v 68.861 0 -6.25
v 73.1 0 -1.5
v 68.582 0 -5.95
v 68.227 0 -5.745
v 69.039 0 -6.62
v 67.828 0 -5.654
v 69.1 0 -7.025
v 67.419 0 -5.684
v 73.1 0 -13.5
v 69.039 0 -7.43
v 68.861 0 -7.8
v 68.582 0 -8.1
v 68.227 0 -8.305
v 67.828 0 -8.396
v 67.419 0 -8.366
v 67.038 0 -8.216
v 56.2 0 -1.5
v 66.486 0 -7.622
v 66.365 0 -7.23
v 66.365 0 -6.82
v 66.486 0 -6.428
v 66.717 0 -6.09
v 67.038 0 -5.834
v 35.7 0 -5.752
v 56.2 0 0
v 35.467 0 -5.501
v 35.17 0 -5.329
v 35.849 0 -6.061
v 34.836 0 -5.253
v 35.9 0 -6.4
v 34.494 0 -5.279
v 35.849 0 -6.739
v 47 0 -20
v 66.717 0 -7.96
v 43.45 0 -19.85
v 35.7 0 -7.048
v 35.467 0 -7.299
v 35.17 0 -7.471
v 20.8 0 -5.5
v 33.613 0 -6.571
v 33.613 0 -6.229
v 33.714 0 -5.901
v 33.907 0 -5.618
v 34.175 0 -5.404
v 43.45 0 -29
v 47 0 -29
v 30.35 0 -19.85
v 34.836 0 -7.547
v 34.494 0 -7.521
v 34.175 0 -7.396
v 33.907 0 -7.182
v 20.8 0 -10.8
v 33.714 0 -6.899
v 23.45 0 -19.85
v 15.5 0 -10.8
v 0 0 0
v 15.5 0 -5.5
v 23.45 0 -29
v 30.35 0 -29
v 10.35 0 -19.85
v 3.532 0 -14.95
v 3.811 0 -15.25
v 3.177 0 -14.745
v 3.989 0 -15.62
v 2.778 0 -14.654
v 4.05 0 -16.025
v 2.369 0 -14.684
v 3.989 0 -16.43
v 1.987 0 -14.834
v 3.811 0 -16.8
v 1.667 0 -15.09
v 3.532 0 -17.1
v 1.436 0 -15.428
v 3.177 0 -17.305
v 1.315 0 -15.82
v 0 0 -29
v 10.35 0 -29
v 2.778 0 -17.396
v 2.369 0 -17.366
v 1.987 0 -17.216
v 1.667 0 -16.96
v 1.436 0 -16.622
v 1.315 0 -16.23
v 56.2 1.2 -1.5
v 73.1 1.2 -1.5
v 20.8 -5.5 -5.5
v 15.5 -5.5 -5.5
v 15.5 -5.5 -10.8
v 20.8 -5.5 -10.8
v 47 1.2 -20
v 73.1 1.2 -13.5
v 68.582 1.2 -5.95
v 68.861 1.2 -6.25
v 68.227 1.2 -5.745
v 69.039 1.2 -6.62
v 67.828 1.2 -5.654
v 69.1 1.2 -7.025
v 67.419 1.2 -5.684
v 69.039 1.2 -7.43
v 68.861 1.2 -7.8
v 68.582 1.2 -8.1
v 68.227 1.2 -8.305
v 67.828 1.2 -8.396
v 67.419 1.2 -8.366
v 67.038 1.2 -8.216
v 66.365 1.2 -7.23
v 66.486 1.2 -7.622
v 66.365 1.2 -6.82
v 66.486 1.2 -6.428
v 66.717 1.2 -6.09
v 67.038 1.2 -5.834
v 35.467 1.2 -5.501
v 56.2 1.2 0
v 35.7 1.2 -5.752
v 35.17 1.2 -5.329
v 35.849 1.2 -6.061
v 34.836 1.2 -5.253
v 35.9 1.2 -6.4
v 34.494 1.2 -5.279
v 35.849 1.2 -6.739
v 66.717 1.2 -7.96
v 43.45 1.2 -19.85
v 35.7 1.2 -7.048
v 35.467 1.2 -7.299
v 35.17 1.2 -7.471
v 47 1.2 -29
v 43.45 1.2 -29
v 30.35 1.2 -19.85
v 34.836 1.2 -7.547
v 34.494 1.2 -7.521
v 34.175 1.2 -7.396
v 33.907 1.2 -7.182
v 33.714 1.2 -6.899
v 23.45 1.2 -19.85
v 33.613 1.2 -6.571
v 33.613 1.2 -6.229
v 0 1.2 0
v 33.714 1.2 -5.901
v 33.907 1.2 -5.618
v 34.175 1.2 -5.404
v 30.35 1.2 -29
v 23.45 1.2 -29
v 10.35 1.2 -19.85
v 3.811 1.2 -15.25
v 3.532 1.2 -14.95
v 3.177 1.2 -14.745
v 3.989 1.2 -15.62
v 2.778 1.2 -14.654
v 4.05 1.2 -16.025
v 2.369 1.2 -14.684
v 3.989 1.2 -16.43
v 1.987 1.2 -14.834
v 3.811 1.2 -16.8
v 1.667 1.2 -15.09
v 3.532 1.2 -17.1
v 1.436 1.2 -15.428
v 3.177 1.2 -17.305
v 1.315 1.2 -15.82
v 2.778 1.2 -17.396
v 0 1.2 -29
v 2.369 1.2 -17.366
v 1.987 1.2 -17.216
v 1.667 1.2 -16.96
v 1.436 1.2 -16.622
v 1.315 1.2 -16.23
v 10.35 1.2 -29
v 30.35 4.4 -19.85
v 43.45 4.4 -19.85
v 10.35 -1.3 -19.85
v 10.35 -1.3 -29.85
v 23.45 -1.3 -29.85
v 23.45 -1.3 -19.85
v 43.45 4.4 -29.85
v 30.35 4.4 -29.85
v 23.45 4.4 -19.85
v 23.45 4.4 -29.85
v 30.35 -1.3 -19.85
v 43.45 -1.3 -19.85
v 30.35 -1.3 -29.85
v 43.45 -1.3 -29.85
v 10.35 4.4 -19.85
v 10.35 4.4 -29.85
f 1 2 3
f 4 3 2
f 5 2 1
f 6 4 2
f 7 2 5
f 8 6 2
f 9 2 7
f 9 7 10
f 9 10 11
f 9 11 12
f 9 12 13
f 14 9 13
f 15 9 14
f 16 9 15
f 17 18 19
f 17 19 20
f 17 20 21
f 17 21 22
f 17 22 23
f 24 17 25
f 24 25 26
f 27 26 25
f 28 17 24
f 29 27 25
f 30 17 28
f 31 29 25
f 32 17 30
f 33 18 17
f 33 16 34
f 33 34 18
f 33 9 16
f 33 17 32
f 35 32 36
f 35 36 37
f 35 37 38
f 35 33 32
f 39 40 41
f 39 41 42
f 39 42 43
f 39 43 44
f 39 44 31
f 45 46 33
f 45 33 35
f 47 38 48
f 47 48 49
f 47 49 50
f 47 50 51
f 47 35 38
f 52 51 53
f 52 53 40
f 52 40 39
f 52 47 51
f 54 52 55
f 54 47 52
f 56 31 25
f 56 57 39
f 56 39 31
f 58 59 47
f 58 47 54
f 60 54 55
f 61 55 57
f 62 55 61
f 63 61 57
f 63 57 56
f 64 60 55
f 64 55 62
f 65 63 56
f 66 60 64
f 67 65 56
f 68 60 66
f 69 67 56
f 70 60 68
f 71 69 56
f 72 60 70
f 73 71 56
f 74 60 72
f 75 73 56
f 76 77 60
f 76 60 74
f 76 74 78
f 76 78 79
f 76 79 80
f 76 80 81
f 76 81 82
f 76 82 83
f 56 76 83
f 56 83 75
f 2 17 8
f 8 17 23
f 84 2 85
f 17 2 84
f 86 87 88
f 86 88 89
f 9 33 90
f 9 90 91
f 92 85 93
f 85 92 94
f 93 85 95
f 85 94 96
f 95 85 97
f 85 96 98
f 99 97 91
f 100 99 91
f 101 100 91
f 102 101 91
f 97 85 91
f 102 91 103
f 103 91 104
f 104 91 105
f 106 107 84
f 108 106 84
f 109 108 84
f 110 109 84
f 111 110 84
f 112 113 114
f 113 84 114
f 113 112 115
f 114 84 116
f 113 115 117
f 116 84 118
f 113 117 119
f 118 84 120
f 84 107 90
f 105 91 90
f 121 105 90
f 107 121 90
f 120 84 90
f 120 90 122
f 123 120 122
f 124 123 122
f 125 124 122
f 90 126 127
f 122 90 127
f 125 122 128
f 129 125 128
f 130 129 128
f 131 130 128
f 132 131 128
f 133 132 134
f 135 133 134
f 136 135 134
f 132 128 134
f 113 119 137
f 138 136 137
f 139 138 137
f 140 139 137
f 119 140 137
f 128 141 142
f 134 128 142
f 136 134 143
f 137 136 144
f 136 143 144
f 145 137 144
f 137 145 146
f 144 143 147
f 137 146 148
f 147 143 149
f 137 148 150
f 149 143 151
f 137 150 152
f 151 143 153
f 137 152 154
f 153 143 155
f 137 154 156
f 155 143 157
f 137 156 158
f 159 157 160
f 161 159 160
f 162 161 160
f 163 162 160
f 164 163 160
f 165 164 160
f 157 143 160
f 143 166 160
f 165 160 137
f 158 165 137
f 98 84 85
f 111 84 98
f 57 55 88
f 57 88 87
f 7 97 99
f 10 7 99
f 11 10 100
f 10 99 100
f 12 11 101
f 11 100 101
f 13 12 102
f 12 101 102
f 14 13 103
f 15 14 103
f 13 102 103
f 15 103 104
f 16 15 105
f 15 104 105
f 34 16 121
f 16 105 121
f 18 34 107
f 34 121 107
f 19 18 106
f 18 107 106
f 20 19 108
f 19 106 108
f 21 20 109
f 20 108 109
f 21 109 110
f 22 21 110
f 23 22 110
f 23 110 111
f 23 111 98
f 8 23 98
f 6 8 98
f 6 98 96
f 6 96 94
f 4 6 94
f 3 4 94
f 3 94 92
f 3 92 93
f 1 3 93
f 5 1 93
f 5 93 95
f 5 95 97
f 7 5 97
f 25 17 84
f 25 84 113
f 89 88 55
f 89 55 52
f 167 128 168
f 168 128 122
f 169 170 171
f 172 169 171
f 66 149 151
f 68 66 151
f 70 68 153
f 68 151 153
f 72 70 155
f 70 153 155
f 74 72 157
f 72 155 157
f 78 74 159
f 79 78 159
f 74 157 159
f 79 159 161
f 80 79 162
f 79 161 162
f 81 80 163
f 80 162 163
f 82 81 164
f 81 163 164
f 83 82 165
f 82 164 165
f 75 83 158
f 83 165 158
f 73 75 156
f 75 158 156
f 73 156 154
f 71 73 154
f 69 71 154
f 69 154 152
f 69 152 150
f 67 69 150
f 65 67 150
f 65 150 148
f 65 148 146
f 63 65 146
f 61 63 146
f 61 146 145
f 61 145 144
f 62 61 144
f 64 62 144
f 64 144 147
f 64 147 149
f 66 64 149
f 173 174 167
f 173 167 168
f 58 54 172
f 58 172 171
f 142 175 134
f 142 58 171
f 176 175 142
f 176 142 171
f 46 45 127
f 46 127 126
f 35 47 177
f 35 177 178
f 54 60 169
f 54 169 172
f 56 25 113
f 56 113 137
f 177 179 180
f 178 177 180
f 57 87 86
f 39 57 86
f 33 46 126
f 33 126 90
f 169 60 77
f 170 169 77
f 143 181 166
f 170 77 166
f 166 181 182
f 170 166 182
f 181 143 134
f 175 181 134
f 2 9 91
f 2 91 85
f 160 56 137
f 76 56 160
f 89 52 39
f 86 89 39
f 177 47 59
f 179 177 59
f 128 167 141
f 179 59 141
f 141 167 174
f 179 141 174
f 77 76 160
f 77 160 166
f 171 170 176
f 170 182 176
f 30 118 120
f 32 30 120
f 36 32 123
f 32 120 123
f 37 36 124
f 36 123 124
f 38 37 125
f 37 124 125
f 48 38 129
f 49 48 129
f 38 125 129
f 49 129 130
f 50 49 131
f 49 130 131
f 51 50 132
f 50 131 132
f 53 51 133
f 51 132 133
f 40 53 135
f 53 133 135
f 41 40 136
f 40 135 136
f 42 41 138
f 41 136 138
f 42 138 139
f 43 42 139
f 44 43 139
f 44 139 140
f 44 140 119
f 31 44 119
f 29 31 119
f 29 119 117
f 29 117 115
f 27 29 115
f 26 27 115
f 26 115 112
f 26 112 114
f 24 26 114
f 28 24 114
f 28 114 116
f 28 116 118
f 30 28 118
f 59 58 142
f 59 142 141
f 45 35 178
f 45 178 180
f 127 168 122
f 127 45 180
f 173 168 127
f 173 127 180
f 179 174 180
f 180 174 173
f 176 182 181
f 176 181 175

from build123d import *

# Parameters (mm, degrees)
EXTRUDE_1_DEPTH      = 1.2
SKETCH_2_R           = 1.375
SKETCH_2_R_2         = 1.15
CUT_EXTRUDE_1_DEPTH  = 2.2
SKETCH_3_W           = 13.1
SKETCH_3_H           = 10
EXTRUDE_2_DEPTH      = 3.2
EXTRUDE_2_DEPTH_BACK = 2.5
SKETCH_4_W           = 5.3
SKETCH_4_H           = 5.3
EXTRUDE_3_DEPTH      = 5.5


with BuildPart() as part:
    # Эскиз1 → Бобышка-Вытянуть1 (new body)
    with BuildSketch(Plane(origin=(0, 0, 0), x_dir=(1, 0, 0), z_dir=(0, 1, 0))):
        Polygon((0, 0), (0, 29), (47, 29), (47, 20), (73.1, 13.5), (73.1, 1.5), (56.2, 1.5), (56.2, 0), align=None)
    extrude(amount=EXTRUDE_1_DEPTH)

    # Эскиз2 → Вырез-Вытянуть1 (cut, through all)
    with BuildSketch(Plane(origin=(0, 1.2, 0), x_dir=(1, 0, 0), z_dir=(0, 1, 0))):
        with Locations((2.675, 16.025)):
            Circle(SKETCH_2_R)
        with Locations((67.725, 7.025)):
            Circle(SKETCH_2_R)
        with Locations((34.75, 6.4)):
            Circle(SKETCH_2_R_2)
    extrude(amount=-CUT_EXTRUDE_1_DEPTH, mode=Mode.SUBTRACT)

    # Эскиз3 → Бобышка-Вытянуть2 (add, two sides)
    with BuildSketch(Plane(origin=(0, 1.2, 0), x_dir=(1, 0, 0), z_dir=(0, 1, 0))) as extrude_2_sk:
        with Locations((16.9, 24.85)):
            Rectangle(SKETCH_3_W, SKETCH_3_H)
        with Locations((36.9, 24.85)):
            Rectangle(SKETCH_3_W, SKETCH_3_H)
    extrude(amount=EXTRUDE_2_DEPTH)
    extrude(extrude_2_sk.sketch, amount=-EXTRUDE_2_DEPTH_BACK)

    # Эскиз4 → Бобышка-Вытянуть3 (add)
    with BuildSketch(Plane.XZ):
        with Locations((18.15, -8.15)):
            Rectangle(SKETCH_4_W, SKETCH_4_H)
    extrude(amount=EXTRUDE_3_DEPTH)


solid = part.part
